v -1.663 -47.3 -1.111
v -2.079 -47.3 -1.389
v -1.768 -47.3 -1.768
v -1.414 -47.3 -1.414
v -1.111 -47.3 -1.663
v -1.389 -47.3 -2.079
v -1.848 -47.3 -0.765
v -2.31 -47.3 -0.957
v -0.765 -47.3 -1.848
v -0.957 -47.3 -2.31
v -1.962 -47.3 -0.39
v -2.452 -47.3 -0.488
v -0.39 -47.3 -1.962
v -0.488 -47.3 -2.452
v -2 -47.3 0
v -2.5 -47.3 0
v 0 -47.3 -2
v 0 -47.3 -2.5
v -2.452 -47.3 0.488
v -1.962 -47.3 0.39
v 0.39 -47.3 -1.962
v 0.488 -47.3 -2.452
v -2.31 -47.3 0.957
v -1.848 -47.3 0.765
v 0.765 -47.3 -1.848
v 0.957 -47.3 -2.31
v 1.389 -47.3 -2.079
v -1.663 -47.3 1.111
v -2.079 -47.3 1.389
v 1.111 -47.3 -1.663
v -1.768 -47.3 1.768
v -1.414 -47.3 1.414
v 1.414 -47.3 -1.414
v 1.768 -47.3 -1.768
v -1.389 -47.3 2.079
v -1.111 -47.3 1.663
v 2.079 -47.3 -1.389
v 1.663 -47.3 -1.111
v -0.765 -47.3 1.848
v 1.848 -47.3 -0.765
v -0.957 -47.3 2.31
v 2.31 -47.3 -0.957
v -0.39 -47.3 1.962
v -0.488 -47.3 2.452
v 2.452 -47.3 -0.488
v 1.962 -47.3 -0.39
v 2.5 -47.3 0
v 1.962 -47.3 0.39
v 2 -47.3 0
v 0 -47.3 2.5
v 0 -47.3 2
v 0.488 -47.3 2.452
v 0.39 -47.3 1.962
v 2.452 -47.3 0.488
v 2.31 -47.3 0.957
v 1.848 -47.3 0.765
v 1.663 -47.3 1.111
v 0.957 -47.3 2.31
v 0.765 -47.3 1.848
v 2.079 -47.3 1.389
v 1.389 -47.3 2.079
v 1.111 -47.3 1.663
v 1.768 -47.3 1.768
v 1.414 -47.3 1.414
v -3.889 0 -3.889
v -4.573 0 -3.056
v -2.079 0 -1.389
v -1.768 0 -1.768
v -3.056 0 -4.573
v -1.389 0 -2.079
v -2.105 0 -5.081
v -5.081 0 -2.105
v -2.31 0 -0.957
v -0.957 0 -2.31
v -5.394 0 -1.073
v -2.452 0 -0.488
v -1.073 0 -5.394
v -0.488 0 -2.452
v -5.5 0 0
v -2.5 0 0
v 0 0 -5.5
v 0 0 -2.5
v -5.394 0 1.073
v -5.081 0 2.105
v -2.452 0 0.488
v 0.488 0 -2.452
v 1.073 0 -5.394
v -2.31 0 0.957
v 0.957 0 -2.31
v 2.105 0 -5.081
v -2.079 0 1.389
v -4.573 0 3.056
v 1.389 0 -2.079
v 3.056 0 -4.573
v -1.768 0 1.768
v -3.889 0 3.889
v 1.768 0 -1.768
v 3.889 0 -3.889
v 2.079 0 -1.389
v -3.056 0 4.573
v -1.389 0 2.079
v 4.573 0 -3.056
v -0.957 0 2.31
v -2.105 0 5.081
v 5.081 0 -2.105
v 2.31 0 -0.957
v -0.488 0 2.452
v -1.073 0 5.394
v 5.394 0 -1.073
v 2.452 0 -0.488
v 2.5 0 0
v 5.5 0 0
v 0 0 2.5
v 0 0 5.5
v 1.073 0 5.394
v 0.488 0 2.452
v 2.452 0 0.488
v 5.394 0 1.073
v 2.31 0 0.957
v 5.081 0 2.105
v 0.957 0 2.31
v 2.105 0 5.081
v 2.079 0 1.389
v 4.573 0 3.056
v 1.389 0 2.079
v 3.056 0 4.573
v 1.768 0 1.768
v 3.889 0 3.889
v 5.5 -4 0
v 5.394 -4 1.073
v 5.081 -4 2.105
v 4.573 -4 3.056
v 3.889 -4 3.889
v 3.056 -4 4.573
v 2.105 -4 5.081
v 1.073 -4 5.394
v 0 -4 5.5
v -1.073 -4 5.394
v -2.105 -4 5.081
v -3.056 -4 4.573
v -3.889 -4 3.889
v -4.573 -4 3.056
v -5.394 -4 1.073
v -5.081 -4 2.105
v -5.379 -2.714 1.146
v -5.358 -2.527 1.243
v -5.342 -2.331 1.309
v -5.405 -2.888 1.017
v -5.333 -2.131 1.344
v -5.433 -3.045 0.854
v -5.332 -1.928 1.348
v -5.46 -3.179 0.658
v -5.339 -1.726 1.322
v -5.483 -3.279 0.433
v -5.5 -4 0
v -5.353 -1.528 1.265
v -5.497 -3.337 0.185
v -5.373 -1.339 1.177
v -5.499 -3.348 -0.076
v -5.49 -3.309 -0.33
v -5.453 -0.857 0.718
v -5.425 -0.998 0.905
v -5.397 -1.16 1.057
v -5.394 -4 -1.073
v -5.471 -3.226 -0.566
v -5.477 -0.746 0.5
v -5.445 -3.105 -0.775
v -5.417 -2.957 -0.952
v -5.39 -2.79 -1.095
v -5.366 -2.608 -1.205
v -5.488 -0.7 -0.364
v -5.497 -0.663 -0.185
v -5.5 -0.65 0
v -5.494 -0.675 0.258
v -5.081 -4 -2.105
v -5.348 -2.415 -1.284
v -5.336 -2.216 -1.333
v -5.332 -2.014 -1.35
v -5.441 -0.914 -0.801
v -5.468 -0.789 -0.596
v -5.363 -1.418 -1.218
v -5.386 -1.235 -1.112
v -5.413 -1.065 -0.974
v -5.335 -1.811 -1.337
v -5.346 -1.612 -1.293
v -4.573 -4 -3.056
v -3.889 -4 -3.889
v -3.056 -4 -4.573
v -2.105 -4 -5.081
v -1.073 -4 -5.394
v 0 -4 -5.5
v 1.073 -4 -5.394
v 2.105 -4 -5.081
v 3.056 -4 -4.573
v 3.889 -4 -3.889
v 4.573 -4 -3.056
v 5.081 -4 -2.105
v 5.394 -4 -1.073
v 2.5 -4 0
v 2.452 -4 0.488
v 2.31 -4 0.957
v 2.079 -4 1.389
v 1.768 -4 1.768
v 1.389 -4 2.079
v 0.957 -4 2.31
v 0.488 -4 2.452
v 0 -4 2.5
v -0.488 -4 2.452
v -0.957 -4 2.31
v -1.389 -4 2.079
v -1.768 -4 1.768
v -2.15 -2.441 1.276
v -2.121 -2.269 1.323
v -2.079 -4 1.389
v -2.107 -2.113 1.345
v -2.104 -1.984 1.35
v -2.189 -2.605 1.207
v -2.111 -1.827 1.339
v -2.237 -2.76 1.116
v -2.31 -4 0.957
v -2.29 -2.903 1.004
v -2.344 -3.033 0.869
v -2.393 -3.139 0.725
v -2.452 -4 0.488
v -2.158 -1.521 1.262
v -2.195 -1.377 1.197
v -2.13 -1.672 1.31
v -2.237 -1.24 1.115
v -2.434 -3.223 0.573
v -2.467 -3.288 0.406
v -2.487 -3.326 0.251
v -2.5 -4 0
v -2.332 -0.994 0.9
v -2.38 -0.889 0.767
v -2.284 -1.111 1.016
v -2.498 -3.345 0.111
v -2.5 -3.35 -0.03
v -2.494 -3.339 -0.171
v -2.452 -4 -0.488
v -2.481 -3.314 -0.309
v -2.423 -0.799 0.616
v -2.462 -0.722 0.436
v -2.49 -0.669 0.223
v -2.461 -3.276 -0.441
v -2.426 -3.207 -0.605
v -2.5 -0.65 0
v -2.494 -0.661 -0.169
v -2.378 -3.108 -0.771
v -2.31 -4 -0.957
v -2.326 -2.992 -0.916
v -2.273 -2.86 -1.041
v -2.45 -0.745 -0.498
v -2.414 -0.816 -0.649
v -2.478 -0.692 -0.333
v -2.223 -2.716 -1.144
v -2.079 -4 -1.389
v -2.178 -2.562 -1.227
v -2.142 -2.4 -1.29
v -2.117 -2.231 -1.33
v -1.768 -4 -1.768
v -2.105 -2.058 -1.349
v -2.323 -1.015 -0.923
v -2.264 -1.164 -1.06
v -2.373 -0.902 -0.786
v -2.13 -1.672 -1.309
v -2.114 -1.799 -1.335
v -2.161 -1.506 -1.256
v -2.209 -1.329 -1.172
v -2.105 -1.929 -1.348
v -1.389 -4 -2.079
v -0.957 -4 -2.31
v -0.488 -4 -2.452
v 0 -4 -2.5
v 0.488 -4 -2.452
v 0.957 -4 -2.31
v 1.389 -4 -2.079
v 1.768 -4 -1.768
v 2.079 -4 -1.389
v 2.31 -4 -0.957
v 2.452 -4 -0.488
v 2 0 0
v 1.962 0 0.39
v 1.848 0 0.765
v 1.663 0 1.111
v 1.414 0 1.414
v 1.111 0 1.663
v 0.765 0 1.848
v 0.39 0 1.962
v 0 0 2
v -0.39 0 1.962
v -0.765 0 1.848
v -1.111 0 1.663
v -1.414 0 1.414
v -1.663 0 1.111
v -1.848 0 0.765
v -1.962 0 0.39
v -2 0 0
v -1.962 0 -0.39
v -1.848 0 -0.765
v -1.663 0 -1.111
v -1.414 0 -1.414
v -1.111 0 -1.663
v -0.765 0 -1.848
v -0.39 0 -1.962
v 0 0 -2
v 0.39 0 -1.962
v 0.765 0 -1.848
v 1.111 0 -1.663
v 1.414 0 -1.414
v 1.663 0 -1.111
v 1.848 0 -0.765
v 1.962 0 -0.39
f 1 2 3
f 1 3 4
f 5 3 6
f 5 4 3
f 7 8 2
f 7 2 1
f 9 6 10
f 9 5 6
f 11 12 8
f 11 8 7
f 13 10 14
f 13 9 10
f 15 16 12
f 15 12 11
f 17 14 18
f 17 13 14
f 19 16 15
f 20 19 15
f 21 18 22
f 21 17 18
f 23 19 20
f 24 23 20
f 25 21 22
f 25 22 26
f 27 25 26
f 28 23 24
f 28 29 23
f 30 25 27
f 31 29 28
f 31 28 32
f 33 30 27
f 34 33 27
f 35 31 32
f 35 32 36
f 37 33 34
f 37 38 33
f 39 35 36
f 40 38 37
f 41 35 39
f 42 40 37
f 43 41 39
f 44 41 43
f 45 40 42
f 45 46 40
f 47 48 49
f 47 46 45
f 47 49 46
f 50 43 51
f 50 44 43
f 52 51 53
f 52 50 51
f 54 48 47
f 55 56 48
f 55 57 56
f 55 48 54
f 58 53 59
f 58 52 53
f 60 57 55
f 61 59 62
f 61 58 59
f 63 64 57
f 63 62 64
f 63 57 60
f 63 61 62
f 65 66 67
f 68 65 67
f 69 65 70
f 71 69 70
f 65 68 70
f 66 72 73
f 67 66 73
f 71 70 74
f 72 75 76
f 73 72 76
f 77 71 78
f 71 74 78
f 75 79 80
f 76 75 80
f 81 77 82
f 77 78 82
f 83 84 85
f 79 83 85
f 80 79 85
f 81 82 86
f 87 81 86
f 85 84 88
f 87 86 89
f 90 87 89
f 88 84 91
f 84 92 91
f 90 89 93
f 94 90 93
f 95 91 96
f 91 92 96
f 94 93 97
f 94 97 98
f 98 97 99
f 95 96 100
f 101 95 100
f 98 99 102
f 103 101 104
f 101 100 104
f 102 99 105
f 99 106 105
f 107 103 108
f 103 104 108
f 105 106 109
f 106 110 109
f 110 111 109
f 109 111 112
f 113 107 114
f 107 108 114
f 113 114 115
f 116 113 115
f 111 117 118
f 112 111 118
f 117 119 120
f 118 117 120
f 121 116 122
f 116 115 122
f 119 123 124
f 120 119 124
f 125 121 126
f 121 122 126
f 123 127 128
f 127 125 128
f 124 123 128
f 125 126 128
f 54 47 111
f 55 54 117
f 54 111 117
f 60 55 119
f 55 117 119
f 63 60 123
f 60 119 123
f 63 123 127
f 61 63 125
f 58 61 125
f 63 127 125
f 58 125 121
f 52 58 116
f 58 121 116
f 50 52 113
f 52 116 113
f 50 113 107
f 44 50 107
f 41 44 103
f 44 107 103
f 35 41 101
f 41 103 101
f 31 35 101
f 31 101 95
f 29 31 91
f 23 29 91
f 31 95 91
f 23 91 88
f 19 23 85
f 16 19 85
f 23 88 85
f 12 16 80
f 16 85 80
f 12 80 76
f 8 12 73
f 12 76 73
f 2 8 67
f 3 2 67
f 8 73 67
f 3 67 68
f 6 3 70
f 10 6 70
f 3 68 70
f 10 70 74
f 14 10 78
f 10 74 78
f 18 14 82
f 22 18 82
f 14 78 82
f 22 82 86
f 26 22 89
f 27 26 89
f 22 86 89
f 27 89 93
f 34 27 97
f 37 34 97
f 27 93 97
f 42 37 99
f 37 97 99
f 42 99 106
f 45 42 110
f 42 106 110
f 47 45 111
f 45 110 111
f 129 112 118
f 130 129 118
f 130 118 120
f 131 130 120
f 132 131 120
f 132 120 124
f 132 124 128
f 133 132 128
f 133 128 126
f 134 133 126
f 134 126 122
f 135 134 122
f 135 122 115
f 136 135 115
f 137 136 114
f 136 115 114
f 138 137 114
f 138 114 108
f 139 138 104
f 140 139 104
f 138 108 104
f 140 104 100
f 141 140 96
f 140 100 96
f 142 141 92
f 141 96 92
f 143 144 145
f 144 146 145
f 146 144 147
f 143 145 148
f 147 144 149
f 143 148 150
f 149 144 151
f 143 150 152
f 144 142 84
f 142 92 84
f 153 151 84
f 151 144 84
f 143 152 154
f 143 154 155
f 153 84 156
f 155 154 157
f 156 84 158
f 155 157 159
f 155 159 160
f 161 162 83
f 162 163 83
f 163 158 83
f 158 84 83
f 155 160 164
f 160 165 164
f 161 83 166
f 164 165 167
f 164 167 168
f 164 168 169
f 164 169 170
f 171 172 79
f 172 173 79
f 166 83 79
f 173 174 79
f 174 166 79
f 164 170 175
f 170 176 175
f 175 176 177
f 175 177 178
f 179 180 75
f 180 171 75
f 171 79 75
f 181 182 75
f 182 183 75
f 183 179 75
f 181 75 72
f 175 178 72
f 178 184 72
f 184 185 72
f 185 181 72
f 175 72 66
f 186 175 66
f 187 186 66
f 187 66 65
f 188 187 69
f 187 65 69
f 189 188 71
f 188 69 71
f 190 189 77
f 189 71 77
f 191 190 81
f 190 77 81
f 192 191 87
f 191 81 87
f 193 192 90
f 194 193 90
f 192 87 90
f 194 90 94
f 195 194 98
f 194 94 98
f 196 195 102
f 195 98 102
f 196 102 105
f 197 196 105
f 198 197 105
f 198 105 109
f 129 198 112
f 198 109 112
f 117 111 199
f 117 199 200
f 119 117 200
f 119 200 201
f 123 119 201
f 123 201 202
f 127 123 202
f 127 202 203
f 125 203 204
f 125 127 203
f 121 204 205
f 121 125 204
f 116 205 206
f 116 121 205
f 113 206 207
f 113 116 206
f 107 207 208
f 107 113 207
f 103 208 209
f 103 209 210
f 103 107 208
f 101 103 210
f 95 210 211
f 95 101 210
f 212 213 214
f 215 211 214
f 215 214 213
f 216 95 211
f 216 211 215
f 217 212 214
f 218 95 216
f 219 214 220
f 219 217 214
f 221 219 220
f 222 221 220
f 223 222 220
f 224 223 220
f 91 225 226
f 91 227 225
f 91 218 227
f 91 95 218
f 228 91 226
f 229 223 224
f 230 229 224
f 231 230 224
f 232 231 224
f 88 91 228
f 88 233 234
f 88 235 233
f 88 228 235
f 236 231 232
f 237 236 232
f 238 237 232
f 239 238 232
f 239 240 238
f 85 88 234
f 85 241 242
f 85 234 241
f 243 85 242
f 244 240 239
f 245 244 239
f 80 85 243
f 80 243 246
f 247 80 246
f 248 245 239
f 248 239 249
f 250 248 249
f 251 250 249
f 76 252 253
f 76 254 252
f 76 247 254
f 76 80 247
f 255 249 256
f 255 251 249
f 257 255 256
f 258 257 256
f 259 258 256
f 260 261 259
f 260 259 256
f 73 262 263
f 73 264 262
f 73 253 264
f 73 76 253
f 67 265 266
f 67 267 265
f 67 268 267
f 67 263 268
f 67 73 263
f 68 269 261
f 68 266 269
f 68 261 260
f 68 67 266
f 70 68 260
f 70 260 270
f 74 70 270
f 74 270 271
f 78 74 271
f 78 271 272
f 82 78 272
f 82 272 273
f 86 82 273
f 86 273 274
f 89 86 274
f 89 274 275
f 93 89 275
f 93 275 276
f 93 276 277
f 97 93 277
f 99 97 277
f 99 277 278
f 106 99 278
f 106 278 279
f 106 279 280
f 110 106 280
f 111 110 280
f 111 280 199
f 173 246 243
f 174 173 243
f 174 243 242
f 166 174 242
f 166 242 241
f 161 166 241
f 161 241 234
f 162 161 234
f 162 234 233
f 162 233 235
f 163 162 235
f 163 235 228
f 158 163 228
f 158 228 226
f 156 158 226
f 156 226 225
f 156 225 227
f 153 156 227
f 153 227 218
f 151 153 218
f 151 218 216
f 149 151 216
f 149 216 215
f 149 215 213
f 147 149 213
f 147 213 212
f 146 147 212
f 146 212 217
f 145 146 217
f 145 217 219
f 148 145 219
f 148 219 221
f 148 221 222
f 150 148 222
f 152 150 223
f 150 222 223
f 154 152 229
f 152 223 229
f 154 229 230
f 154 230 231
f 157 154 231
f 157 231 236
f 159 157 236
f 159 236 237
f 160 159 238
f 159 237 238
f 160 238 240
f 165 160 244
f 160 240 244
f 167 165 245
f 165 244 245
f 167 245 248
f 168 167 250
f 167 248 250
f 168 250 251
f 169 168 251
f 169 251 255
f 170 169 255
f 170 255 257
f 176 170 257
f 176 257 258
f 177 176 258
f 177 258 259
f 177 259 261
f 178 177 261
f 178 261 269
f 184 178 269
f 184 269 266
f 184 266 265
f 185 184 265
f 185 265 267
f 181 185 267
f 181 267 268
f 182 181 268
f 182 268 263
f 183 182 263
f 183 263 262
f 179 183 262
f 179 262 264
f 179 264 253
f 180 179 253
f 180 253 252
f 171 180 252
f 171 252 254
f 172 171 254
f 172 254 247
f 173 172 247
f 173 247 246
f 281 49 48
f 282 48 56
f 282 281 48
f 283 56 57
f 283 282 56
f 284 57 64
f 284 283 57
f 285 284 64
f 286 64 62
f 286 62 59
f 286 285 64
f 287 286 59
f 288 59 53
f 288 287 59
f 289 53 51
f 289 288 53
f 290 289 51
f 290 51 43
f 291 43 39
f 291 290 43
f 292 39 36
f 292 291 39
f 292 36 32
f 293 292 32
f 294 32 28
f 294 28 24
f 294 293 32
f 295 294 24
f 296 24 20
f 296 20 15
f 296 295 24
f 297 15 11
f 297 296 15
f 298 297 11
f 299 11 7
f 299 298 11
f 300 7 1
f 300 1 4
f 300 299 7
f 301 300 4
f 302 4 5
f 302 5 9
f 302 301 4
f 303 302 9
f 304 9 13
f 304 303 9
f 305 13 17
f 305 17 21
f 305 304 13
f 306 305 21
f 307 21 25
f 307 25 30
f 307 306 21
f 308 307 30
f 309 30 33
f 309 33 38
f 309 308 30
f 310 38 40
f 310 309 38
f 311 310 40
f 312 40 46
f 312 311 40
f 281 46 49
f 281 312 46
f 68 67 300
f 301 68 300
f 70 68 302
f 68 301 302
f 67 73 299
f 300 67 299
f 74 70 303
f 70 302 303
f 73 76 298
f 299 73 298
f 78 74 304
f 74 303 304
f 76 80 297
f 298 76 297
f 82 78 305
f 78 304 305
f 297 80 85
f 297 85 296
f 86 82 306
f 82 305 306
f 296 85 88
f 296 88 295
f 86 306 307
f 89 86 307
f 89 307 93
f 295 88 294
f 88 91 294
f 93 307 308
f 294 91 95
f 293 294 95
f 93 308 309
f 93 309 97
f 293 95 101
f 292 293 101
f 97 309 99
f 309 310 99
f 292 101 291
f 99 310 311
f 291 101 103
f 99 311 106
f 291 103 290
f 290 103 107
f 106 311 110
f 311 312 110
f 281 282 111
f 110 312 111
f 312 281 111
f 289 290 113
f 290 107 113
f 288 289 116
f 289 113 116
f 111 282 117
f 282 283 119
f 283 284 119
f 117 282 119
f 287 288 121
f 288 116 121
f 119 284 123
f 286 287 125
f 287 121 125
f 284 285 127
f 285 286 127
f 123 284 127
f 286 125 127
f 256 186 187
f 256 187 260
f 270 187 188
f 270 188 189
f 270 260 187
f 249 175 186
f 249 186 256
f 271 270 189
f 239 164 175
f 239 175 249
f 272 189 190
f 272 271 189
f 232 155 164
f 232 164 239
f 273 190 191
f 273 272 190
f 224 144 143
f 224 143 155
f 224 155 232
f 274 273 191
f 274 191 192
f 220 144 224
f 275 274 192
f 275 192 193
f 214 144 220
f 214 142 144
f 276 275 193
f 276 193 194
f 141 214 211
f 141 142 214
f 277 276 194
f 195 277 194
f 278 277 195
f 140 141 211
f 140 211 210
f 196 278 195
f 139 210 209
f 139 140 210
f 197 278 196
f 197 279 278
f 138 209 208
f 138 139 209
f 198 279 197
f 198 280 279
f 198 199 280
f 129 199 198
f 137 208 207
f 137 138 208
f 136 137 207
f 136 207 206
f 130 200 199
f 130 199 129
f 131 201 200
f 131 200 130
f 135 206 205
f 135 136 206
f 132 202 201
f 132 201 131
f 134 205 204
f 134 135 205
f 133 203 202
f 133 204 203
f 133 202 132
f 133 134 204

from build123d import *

# Parameters (mm, degrees)
F0_R     = 2.5
F0_R_2   = 2
F1_DEPTH = 47.3
F2_R     = 5.5
F2_R_2   = 2.5
F3_DEPTH = 4
F5_D     = 2.7
F5_DEPTH = 5.501


with BuildPart() as f1:
    # F0 (on Front) → F1 (new body)
    with BuildSketch(Plane.XZ):
        Circle(F0_R)
        Circle(F0_R_2, mode=Mode.SUBTRACT)
    extrude(amount=F1_DEPTH)


with BuildPart() as f3:
    # F2 (on Front) → F3 (new body)
    with BuildSketch(Plane.XZ):
        Circle(F2_R)
        Circle(F2_R_2, mode=Mode.SUBTRACT)
    extrude(amount=F3_DEPTH)

    # F5 (through all, one way)
    with BuildSketch(Plane.YZ):
        with Locations((-2, 0)):
            Circle(F5_D / 2)
    extrude(amount=-F5_DEPTH, mode=Mode.SUBTRACT)


solid = Compound([f1.part, f3.part])
